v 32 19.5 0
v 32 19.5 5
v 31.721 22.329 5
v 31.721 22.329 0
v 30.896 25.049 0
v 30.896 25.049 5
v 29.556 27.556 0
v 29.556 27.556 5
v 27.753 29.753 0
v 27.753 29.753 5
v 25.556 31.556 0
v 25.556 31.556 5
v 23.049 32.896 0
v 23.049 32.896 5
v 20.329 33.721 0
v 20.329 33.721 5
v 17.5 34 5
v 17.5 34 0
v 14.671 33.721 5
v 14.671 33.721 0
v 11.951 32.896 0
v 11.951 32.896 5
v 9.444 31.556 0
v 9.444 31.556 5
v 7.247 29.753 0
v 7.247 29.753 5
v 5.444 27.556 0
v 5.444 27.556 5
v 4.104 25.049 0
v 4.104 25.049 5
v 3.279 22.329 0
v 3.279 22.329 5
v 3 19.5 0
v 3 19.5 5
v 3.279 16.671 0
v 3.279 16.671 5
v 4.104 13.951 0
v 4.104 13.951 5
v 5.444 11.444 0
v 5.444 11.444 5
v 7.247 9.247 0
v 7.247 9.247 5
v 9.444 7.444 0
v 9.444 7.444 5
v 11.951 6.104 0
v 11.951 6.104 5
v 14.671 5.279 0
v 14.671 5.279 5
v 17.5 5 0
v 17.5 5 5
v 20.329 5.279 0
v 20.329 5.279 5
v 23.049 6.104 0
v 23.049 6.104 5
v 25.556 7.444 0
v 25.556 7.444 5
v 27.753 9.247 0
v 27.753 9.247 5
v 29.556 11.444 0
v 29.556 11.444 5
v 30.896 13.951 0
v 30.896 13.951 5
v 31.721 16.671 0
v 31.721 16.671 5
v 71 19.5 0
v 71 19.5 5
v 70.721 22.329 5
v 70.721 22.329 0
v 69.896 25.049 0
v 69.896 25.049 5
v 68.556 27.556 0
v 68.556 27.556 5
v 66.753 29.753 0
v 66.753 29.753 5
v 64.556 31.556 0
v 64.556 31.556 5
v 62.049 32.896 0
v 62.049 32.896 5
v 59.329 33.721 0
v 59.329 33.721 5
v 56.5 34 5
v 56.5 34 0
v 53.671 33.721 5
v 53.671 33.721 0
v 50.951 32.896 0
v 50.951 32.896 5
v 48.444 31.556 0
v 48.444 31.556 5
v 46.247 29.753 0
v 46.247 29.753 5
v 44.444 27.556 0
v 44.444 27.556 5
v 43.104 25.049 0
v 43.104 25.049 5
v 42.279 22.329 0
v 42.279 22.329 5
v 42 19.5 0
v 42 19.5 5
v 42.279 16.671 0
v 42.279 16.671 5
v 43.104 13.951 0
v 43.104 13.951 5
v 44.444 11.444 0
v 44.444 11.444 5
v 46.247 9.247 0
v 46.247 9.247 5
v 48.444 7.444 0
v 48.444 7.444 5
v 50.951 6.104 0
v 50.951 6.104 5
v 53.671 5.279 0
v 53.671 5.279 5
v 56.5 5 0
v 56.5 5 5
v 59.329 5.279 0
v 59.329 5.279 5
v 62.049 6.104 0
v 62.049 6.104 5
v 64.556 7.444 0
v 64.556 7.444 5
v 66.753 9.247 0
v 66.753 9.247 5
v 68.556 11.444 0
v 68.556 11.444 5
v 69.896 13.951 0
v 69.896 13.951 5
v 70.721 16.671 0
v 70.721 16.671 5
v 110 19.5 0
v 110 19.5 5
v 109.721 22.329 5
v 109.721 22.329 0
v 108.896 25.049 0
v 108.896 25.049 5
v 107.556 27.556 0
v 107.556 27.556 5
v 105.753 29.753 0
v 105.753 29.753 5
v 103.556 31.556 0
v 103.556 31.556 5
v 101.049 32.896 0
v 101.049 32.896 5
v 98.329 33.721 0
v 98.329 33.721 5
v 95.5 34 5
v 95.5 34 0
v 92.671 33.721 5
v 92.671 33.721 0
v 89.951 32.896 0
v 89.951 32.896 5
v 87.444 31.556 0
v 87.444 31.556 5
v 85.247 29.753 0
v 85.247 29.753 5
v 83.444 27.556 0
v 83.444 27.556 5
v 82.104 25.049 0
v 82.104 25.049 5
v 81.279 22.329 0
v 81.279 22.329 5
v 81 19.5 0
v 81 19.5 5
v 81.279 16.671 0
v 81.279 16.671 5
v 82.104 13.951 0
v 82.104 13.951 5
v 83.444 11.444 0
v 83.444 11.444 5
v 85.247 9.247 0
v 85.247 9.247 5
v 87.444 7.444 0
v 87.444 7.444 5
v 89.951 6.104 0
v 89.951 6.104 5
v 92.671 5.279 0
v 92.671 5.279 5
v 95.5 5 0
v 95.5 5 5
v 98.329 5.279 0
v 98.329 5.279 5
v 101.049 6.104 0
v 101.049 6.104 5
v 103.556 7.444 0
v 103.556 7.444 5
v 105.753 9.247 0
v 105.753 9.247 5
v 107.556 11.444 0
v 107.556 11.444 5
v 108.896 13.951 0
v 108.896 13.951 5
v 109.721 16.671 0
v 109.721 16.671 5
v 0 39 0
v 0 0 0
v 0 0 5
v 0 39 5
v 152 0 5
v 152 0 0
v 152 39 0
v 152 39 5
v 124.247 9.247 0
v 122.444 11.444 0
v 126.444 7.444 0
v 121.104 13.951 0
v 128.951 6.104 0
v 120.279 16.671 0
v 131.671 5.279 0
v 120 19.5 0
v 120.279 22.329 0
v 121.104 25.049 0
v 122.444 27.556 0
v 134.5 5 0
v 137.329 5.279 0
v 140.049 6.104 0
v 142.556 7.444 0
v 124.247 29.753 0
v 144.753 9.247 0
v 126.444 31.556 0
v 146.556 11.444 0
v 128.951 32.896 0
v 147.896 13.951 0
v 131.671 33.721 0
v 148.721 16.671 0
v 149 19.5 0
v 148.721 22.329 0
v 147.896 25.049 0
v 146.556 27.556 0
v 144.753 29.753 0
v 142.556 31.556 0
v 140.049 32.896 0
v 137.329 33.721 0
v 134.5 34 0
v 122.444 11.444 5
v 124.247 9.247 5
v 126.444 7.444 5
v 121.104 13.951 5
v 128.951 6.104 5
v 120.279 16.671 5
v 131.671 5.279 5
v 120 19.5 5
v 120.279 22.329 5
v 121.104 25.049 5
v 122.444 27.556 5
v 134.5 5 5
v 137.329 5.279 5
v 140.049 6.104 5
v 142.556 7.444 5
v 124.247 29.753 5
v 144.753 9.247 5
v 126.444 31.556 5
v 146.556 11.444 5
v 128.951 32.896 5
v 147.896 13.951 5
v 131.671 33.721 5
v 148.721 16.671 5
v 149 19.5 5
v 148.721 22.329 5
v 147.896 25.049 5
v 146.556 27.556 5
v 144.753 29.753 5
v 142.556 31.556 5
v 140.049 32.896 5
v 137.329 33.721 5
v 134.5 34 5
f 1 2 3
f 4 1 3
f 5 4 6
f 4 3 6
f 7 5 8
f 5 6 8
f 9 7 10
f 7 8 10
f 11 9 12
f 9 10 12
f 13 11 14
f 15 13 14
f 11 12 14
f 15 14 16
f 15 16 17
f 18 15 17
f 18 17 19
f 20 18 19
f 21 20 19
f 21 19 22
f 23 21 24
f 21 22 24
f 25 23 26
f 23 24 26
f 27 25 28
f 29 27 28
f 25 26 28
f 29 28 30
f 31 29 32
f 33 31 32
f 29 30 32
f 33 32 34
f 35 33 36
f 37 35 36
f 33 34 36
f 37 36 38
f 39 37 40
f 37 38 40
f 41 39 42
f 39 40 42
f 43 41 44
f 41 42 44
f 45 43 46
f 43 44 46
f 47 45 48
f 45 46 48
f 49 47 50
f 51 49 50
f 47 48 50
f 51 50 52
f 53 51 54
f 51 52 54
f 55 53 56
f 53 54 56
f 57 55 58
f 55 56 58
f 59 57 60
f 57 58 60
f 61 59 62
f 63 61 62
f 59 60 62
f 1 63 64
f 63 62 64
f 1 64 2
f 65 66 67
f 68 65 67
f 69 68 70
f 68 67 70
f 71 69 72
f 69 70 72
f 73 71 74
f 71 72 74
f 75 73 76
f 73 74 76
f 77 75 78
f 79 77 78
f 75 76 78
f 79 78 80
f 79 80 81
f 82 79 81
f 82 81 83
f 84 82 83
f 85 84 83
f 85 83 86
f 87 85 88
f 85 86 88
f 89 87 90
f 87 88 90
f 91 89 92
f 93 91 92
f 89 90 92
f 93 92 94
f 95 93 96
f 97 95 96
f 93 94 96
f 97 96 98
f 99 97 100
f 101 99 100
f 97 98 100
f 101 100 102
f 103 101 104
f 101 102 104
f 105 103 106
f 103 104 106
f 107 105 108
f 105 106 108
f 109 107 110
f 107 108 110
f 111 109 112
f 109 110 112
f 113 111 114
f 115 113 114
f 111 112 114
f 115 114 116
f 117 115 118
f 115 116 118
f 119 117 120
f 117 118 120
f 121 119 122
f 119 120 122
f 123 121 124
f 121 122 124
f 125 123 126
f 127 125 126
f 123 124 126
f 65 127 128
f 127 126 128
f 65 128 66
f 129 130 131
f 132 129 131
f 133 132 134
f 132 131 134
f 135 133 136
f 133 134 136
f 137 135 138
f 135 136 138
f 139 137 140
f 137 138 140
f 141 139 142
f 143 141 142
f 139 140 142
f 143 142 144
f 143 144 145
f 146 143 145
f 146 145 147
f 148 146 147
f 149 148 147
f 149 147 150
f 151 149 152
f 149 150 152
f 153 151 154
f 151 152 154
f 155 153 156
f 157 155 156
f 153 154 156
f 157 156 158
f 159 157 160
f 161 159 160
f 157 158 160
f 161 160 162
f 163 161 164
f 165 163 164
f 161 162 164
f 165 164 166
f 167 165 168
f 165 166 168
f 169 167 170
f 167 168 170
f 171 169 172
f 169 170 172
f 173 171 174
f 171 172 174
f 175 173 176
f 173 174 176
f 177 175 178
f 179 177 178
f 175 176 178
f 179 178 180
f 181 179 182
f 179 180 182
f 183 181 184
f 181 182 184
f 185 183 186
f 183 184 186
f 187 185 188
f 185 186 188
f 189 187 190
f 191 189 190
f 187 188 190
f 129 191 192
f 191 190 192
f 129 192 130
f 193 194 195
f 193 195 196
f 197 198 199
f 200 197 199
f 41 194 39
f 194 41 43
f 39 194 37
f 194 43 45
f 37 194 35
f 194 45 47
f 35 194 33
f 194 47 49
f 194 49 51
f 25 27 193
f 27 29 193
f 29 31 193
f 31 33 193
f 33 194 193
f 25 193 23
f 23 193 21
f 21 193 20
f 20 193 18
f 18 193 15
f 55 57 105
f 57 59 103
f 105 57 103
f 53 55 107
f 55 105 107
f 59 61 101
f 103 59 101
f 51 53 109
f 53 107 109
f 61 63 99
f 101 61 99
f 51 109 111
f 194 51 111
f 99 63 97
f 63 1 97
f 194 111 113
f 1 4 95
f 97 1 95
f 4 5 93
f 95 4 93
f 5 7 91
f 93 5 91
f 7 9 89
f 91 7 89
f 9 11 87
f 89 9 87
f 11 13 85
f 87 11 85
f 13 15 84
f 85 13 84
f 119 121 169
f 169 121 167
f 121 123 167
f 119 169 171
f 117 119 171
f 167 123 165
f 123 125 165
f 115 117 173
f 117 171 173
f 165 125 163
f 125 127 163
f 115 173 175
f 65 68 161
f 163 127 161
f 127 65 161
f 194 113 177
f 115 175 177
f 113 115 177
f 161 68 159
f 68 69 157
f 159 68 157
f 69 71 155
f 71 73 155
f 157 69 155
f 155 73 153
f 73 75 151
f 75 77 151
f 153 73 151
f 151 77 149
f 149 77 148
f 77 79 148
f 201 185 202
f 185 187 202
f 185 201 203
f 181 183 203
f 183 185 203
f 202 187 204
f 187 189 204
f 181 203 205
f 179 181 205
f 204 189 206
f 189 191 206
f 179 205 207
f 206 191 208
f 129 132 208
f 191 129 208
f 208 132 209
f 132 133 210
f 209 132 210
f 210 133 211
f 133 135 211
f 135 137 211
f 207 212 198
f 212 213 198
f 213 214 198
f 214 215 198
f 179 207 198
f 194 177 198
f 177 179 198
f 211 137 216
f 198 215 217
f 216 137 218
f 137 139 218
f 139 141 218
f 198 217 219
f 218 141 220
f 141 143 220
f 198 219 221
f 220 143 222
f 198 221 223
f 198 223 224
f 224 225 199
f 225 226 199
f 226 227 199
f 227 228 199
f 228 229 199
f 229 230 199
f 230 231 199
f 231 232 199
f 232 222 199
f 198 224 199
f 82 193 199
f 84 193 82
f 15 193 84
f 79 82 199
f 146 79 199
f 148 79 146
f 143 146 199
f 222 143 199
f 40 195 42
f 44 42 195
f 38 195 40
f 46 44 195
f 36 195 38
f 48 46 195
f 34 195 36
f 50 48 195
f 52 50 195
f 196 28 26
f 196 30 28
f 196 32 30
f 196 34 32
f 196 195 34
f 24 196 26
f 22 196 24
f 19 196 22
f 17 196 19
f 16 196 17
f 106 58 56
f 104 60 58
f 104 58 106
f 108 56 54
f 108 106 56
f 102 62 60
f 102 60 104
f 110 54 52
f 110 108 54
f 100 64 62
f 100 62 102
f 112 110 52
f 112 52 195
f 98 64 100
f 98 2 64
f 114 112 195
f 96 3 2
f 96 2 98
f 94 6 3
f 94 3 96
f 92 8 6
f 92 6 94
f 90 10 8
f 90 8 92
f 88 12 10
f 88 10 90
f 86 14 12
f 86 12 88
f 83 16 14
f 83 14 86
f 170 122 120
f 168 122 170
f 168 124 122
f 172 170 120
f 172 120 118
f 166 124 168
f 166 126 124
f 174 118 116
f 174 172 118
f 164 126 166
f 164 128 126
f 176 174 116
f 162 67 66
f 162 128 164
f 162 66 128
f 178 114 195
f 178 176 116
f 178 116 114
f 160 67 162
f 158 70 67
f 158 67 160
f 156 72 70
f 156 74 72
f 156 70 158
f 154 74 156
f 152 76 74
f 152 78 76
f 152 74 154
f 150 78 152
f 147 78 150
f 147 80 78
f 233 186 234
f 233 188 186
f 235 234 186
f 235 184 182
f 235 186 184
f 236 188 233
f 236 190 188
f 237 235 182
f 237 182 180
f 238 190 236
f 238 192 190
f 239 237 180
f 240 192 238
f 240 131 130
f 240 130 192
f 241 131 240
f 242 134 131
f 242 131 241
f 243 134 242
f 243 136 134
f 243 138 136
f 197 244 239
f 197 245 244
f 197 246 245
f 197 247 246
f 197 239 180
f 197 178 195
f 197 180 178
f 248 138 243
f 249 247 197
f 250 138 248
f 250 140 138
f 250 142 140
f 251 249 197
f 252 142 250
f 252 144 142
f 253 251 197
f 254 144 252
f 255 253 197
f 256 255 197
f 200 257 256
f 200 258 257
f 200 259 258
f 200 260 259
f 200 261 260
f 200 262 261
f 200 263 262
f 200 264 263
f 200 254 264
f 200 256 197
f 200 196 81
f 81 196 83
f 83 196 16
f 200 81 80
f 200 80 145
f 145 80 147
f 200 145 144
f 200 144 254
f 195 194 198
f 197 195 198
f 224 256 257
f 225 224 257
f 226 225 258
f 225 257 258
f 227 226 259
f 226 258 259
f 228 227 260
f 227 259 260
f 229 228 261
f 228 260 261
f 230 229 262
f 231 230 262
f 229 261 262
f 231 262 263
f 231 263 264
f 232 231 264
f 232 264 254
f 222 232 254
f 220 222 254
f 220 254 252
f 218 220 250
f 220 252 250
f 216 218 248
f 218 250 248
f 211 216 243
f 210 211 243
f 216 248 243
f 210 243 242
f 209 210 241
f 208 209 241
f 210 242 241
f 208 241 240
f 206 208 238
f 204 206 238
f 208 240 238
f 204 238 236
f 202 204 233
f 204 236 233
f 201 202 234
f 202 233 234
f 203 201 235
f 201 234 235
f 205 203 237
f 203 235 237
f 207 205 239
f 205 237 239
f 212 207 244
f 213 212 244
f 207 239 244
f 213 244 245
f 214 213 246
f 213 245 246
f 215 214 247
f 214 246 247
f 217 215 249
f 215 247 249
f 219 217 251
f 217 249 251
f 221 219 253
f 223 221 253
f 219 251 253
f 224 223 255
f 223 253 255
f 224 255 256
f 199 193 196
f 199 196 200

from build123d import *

# Parameters (mm, degrees)
SKETCH_W            = 152
SKETCH_H            = 39
PAD_DEPTH           = 5
SKETCH001_R         = 14.5
POCKET_DEPTH        = 5
LINEARPATTERN_COUNT = 4
LINEARPATTERN_PITCH = 39


with BuildPart() as part:
    # Sketch → Pad (new body)
    with BuildSketch(Plane.XY):
        with Locations((76, 19.5)):
            Rectangle(SKETCH_W, SKETCH_H)
    extrude(amount=PAD_DEPTH)

    # Sketch001 → Pocket (cut)
    with BuildSketch(Plane.XY.offset(5)):
        with Locations((17.5, 19.5)):
            Circle(SKETCH001_R)
    pocket = extrude(amount=-POCKET_DEPTH, mode=Mode.SUBTRACT)

    # LinearPattern: Pocket ×4
    with Locations(*[(i * LINEARPATTERN_PITCH, 0, 0) for i in range(1, LINEARPATTERN_COUNT)]):
        add(pocket, mode=Mode.SUBTRACT)


solid = part.part
